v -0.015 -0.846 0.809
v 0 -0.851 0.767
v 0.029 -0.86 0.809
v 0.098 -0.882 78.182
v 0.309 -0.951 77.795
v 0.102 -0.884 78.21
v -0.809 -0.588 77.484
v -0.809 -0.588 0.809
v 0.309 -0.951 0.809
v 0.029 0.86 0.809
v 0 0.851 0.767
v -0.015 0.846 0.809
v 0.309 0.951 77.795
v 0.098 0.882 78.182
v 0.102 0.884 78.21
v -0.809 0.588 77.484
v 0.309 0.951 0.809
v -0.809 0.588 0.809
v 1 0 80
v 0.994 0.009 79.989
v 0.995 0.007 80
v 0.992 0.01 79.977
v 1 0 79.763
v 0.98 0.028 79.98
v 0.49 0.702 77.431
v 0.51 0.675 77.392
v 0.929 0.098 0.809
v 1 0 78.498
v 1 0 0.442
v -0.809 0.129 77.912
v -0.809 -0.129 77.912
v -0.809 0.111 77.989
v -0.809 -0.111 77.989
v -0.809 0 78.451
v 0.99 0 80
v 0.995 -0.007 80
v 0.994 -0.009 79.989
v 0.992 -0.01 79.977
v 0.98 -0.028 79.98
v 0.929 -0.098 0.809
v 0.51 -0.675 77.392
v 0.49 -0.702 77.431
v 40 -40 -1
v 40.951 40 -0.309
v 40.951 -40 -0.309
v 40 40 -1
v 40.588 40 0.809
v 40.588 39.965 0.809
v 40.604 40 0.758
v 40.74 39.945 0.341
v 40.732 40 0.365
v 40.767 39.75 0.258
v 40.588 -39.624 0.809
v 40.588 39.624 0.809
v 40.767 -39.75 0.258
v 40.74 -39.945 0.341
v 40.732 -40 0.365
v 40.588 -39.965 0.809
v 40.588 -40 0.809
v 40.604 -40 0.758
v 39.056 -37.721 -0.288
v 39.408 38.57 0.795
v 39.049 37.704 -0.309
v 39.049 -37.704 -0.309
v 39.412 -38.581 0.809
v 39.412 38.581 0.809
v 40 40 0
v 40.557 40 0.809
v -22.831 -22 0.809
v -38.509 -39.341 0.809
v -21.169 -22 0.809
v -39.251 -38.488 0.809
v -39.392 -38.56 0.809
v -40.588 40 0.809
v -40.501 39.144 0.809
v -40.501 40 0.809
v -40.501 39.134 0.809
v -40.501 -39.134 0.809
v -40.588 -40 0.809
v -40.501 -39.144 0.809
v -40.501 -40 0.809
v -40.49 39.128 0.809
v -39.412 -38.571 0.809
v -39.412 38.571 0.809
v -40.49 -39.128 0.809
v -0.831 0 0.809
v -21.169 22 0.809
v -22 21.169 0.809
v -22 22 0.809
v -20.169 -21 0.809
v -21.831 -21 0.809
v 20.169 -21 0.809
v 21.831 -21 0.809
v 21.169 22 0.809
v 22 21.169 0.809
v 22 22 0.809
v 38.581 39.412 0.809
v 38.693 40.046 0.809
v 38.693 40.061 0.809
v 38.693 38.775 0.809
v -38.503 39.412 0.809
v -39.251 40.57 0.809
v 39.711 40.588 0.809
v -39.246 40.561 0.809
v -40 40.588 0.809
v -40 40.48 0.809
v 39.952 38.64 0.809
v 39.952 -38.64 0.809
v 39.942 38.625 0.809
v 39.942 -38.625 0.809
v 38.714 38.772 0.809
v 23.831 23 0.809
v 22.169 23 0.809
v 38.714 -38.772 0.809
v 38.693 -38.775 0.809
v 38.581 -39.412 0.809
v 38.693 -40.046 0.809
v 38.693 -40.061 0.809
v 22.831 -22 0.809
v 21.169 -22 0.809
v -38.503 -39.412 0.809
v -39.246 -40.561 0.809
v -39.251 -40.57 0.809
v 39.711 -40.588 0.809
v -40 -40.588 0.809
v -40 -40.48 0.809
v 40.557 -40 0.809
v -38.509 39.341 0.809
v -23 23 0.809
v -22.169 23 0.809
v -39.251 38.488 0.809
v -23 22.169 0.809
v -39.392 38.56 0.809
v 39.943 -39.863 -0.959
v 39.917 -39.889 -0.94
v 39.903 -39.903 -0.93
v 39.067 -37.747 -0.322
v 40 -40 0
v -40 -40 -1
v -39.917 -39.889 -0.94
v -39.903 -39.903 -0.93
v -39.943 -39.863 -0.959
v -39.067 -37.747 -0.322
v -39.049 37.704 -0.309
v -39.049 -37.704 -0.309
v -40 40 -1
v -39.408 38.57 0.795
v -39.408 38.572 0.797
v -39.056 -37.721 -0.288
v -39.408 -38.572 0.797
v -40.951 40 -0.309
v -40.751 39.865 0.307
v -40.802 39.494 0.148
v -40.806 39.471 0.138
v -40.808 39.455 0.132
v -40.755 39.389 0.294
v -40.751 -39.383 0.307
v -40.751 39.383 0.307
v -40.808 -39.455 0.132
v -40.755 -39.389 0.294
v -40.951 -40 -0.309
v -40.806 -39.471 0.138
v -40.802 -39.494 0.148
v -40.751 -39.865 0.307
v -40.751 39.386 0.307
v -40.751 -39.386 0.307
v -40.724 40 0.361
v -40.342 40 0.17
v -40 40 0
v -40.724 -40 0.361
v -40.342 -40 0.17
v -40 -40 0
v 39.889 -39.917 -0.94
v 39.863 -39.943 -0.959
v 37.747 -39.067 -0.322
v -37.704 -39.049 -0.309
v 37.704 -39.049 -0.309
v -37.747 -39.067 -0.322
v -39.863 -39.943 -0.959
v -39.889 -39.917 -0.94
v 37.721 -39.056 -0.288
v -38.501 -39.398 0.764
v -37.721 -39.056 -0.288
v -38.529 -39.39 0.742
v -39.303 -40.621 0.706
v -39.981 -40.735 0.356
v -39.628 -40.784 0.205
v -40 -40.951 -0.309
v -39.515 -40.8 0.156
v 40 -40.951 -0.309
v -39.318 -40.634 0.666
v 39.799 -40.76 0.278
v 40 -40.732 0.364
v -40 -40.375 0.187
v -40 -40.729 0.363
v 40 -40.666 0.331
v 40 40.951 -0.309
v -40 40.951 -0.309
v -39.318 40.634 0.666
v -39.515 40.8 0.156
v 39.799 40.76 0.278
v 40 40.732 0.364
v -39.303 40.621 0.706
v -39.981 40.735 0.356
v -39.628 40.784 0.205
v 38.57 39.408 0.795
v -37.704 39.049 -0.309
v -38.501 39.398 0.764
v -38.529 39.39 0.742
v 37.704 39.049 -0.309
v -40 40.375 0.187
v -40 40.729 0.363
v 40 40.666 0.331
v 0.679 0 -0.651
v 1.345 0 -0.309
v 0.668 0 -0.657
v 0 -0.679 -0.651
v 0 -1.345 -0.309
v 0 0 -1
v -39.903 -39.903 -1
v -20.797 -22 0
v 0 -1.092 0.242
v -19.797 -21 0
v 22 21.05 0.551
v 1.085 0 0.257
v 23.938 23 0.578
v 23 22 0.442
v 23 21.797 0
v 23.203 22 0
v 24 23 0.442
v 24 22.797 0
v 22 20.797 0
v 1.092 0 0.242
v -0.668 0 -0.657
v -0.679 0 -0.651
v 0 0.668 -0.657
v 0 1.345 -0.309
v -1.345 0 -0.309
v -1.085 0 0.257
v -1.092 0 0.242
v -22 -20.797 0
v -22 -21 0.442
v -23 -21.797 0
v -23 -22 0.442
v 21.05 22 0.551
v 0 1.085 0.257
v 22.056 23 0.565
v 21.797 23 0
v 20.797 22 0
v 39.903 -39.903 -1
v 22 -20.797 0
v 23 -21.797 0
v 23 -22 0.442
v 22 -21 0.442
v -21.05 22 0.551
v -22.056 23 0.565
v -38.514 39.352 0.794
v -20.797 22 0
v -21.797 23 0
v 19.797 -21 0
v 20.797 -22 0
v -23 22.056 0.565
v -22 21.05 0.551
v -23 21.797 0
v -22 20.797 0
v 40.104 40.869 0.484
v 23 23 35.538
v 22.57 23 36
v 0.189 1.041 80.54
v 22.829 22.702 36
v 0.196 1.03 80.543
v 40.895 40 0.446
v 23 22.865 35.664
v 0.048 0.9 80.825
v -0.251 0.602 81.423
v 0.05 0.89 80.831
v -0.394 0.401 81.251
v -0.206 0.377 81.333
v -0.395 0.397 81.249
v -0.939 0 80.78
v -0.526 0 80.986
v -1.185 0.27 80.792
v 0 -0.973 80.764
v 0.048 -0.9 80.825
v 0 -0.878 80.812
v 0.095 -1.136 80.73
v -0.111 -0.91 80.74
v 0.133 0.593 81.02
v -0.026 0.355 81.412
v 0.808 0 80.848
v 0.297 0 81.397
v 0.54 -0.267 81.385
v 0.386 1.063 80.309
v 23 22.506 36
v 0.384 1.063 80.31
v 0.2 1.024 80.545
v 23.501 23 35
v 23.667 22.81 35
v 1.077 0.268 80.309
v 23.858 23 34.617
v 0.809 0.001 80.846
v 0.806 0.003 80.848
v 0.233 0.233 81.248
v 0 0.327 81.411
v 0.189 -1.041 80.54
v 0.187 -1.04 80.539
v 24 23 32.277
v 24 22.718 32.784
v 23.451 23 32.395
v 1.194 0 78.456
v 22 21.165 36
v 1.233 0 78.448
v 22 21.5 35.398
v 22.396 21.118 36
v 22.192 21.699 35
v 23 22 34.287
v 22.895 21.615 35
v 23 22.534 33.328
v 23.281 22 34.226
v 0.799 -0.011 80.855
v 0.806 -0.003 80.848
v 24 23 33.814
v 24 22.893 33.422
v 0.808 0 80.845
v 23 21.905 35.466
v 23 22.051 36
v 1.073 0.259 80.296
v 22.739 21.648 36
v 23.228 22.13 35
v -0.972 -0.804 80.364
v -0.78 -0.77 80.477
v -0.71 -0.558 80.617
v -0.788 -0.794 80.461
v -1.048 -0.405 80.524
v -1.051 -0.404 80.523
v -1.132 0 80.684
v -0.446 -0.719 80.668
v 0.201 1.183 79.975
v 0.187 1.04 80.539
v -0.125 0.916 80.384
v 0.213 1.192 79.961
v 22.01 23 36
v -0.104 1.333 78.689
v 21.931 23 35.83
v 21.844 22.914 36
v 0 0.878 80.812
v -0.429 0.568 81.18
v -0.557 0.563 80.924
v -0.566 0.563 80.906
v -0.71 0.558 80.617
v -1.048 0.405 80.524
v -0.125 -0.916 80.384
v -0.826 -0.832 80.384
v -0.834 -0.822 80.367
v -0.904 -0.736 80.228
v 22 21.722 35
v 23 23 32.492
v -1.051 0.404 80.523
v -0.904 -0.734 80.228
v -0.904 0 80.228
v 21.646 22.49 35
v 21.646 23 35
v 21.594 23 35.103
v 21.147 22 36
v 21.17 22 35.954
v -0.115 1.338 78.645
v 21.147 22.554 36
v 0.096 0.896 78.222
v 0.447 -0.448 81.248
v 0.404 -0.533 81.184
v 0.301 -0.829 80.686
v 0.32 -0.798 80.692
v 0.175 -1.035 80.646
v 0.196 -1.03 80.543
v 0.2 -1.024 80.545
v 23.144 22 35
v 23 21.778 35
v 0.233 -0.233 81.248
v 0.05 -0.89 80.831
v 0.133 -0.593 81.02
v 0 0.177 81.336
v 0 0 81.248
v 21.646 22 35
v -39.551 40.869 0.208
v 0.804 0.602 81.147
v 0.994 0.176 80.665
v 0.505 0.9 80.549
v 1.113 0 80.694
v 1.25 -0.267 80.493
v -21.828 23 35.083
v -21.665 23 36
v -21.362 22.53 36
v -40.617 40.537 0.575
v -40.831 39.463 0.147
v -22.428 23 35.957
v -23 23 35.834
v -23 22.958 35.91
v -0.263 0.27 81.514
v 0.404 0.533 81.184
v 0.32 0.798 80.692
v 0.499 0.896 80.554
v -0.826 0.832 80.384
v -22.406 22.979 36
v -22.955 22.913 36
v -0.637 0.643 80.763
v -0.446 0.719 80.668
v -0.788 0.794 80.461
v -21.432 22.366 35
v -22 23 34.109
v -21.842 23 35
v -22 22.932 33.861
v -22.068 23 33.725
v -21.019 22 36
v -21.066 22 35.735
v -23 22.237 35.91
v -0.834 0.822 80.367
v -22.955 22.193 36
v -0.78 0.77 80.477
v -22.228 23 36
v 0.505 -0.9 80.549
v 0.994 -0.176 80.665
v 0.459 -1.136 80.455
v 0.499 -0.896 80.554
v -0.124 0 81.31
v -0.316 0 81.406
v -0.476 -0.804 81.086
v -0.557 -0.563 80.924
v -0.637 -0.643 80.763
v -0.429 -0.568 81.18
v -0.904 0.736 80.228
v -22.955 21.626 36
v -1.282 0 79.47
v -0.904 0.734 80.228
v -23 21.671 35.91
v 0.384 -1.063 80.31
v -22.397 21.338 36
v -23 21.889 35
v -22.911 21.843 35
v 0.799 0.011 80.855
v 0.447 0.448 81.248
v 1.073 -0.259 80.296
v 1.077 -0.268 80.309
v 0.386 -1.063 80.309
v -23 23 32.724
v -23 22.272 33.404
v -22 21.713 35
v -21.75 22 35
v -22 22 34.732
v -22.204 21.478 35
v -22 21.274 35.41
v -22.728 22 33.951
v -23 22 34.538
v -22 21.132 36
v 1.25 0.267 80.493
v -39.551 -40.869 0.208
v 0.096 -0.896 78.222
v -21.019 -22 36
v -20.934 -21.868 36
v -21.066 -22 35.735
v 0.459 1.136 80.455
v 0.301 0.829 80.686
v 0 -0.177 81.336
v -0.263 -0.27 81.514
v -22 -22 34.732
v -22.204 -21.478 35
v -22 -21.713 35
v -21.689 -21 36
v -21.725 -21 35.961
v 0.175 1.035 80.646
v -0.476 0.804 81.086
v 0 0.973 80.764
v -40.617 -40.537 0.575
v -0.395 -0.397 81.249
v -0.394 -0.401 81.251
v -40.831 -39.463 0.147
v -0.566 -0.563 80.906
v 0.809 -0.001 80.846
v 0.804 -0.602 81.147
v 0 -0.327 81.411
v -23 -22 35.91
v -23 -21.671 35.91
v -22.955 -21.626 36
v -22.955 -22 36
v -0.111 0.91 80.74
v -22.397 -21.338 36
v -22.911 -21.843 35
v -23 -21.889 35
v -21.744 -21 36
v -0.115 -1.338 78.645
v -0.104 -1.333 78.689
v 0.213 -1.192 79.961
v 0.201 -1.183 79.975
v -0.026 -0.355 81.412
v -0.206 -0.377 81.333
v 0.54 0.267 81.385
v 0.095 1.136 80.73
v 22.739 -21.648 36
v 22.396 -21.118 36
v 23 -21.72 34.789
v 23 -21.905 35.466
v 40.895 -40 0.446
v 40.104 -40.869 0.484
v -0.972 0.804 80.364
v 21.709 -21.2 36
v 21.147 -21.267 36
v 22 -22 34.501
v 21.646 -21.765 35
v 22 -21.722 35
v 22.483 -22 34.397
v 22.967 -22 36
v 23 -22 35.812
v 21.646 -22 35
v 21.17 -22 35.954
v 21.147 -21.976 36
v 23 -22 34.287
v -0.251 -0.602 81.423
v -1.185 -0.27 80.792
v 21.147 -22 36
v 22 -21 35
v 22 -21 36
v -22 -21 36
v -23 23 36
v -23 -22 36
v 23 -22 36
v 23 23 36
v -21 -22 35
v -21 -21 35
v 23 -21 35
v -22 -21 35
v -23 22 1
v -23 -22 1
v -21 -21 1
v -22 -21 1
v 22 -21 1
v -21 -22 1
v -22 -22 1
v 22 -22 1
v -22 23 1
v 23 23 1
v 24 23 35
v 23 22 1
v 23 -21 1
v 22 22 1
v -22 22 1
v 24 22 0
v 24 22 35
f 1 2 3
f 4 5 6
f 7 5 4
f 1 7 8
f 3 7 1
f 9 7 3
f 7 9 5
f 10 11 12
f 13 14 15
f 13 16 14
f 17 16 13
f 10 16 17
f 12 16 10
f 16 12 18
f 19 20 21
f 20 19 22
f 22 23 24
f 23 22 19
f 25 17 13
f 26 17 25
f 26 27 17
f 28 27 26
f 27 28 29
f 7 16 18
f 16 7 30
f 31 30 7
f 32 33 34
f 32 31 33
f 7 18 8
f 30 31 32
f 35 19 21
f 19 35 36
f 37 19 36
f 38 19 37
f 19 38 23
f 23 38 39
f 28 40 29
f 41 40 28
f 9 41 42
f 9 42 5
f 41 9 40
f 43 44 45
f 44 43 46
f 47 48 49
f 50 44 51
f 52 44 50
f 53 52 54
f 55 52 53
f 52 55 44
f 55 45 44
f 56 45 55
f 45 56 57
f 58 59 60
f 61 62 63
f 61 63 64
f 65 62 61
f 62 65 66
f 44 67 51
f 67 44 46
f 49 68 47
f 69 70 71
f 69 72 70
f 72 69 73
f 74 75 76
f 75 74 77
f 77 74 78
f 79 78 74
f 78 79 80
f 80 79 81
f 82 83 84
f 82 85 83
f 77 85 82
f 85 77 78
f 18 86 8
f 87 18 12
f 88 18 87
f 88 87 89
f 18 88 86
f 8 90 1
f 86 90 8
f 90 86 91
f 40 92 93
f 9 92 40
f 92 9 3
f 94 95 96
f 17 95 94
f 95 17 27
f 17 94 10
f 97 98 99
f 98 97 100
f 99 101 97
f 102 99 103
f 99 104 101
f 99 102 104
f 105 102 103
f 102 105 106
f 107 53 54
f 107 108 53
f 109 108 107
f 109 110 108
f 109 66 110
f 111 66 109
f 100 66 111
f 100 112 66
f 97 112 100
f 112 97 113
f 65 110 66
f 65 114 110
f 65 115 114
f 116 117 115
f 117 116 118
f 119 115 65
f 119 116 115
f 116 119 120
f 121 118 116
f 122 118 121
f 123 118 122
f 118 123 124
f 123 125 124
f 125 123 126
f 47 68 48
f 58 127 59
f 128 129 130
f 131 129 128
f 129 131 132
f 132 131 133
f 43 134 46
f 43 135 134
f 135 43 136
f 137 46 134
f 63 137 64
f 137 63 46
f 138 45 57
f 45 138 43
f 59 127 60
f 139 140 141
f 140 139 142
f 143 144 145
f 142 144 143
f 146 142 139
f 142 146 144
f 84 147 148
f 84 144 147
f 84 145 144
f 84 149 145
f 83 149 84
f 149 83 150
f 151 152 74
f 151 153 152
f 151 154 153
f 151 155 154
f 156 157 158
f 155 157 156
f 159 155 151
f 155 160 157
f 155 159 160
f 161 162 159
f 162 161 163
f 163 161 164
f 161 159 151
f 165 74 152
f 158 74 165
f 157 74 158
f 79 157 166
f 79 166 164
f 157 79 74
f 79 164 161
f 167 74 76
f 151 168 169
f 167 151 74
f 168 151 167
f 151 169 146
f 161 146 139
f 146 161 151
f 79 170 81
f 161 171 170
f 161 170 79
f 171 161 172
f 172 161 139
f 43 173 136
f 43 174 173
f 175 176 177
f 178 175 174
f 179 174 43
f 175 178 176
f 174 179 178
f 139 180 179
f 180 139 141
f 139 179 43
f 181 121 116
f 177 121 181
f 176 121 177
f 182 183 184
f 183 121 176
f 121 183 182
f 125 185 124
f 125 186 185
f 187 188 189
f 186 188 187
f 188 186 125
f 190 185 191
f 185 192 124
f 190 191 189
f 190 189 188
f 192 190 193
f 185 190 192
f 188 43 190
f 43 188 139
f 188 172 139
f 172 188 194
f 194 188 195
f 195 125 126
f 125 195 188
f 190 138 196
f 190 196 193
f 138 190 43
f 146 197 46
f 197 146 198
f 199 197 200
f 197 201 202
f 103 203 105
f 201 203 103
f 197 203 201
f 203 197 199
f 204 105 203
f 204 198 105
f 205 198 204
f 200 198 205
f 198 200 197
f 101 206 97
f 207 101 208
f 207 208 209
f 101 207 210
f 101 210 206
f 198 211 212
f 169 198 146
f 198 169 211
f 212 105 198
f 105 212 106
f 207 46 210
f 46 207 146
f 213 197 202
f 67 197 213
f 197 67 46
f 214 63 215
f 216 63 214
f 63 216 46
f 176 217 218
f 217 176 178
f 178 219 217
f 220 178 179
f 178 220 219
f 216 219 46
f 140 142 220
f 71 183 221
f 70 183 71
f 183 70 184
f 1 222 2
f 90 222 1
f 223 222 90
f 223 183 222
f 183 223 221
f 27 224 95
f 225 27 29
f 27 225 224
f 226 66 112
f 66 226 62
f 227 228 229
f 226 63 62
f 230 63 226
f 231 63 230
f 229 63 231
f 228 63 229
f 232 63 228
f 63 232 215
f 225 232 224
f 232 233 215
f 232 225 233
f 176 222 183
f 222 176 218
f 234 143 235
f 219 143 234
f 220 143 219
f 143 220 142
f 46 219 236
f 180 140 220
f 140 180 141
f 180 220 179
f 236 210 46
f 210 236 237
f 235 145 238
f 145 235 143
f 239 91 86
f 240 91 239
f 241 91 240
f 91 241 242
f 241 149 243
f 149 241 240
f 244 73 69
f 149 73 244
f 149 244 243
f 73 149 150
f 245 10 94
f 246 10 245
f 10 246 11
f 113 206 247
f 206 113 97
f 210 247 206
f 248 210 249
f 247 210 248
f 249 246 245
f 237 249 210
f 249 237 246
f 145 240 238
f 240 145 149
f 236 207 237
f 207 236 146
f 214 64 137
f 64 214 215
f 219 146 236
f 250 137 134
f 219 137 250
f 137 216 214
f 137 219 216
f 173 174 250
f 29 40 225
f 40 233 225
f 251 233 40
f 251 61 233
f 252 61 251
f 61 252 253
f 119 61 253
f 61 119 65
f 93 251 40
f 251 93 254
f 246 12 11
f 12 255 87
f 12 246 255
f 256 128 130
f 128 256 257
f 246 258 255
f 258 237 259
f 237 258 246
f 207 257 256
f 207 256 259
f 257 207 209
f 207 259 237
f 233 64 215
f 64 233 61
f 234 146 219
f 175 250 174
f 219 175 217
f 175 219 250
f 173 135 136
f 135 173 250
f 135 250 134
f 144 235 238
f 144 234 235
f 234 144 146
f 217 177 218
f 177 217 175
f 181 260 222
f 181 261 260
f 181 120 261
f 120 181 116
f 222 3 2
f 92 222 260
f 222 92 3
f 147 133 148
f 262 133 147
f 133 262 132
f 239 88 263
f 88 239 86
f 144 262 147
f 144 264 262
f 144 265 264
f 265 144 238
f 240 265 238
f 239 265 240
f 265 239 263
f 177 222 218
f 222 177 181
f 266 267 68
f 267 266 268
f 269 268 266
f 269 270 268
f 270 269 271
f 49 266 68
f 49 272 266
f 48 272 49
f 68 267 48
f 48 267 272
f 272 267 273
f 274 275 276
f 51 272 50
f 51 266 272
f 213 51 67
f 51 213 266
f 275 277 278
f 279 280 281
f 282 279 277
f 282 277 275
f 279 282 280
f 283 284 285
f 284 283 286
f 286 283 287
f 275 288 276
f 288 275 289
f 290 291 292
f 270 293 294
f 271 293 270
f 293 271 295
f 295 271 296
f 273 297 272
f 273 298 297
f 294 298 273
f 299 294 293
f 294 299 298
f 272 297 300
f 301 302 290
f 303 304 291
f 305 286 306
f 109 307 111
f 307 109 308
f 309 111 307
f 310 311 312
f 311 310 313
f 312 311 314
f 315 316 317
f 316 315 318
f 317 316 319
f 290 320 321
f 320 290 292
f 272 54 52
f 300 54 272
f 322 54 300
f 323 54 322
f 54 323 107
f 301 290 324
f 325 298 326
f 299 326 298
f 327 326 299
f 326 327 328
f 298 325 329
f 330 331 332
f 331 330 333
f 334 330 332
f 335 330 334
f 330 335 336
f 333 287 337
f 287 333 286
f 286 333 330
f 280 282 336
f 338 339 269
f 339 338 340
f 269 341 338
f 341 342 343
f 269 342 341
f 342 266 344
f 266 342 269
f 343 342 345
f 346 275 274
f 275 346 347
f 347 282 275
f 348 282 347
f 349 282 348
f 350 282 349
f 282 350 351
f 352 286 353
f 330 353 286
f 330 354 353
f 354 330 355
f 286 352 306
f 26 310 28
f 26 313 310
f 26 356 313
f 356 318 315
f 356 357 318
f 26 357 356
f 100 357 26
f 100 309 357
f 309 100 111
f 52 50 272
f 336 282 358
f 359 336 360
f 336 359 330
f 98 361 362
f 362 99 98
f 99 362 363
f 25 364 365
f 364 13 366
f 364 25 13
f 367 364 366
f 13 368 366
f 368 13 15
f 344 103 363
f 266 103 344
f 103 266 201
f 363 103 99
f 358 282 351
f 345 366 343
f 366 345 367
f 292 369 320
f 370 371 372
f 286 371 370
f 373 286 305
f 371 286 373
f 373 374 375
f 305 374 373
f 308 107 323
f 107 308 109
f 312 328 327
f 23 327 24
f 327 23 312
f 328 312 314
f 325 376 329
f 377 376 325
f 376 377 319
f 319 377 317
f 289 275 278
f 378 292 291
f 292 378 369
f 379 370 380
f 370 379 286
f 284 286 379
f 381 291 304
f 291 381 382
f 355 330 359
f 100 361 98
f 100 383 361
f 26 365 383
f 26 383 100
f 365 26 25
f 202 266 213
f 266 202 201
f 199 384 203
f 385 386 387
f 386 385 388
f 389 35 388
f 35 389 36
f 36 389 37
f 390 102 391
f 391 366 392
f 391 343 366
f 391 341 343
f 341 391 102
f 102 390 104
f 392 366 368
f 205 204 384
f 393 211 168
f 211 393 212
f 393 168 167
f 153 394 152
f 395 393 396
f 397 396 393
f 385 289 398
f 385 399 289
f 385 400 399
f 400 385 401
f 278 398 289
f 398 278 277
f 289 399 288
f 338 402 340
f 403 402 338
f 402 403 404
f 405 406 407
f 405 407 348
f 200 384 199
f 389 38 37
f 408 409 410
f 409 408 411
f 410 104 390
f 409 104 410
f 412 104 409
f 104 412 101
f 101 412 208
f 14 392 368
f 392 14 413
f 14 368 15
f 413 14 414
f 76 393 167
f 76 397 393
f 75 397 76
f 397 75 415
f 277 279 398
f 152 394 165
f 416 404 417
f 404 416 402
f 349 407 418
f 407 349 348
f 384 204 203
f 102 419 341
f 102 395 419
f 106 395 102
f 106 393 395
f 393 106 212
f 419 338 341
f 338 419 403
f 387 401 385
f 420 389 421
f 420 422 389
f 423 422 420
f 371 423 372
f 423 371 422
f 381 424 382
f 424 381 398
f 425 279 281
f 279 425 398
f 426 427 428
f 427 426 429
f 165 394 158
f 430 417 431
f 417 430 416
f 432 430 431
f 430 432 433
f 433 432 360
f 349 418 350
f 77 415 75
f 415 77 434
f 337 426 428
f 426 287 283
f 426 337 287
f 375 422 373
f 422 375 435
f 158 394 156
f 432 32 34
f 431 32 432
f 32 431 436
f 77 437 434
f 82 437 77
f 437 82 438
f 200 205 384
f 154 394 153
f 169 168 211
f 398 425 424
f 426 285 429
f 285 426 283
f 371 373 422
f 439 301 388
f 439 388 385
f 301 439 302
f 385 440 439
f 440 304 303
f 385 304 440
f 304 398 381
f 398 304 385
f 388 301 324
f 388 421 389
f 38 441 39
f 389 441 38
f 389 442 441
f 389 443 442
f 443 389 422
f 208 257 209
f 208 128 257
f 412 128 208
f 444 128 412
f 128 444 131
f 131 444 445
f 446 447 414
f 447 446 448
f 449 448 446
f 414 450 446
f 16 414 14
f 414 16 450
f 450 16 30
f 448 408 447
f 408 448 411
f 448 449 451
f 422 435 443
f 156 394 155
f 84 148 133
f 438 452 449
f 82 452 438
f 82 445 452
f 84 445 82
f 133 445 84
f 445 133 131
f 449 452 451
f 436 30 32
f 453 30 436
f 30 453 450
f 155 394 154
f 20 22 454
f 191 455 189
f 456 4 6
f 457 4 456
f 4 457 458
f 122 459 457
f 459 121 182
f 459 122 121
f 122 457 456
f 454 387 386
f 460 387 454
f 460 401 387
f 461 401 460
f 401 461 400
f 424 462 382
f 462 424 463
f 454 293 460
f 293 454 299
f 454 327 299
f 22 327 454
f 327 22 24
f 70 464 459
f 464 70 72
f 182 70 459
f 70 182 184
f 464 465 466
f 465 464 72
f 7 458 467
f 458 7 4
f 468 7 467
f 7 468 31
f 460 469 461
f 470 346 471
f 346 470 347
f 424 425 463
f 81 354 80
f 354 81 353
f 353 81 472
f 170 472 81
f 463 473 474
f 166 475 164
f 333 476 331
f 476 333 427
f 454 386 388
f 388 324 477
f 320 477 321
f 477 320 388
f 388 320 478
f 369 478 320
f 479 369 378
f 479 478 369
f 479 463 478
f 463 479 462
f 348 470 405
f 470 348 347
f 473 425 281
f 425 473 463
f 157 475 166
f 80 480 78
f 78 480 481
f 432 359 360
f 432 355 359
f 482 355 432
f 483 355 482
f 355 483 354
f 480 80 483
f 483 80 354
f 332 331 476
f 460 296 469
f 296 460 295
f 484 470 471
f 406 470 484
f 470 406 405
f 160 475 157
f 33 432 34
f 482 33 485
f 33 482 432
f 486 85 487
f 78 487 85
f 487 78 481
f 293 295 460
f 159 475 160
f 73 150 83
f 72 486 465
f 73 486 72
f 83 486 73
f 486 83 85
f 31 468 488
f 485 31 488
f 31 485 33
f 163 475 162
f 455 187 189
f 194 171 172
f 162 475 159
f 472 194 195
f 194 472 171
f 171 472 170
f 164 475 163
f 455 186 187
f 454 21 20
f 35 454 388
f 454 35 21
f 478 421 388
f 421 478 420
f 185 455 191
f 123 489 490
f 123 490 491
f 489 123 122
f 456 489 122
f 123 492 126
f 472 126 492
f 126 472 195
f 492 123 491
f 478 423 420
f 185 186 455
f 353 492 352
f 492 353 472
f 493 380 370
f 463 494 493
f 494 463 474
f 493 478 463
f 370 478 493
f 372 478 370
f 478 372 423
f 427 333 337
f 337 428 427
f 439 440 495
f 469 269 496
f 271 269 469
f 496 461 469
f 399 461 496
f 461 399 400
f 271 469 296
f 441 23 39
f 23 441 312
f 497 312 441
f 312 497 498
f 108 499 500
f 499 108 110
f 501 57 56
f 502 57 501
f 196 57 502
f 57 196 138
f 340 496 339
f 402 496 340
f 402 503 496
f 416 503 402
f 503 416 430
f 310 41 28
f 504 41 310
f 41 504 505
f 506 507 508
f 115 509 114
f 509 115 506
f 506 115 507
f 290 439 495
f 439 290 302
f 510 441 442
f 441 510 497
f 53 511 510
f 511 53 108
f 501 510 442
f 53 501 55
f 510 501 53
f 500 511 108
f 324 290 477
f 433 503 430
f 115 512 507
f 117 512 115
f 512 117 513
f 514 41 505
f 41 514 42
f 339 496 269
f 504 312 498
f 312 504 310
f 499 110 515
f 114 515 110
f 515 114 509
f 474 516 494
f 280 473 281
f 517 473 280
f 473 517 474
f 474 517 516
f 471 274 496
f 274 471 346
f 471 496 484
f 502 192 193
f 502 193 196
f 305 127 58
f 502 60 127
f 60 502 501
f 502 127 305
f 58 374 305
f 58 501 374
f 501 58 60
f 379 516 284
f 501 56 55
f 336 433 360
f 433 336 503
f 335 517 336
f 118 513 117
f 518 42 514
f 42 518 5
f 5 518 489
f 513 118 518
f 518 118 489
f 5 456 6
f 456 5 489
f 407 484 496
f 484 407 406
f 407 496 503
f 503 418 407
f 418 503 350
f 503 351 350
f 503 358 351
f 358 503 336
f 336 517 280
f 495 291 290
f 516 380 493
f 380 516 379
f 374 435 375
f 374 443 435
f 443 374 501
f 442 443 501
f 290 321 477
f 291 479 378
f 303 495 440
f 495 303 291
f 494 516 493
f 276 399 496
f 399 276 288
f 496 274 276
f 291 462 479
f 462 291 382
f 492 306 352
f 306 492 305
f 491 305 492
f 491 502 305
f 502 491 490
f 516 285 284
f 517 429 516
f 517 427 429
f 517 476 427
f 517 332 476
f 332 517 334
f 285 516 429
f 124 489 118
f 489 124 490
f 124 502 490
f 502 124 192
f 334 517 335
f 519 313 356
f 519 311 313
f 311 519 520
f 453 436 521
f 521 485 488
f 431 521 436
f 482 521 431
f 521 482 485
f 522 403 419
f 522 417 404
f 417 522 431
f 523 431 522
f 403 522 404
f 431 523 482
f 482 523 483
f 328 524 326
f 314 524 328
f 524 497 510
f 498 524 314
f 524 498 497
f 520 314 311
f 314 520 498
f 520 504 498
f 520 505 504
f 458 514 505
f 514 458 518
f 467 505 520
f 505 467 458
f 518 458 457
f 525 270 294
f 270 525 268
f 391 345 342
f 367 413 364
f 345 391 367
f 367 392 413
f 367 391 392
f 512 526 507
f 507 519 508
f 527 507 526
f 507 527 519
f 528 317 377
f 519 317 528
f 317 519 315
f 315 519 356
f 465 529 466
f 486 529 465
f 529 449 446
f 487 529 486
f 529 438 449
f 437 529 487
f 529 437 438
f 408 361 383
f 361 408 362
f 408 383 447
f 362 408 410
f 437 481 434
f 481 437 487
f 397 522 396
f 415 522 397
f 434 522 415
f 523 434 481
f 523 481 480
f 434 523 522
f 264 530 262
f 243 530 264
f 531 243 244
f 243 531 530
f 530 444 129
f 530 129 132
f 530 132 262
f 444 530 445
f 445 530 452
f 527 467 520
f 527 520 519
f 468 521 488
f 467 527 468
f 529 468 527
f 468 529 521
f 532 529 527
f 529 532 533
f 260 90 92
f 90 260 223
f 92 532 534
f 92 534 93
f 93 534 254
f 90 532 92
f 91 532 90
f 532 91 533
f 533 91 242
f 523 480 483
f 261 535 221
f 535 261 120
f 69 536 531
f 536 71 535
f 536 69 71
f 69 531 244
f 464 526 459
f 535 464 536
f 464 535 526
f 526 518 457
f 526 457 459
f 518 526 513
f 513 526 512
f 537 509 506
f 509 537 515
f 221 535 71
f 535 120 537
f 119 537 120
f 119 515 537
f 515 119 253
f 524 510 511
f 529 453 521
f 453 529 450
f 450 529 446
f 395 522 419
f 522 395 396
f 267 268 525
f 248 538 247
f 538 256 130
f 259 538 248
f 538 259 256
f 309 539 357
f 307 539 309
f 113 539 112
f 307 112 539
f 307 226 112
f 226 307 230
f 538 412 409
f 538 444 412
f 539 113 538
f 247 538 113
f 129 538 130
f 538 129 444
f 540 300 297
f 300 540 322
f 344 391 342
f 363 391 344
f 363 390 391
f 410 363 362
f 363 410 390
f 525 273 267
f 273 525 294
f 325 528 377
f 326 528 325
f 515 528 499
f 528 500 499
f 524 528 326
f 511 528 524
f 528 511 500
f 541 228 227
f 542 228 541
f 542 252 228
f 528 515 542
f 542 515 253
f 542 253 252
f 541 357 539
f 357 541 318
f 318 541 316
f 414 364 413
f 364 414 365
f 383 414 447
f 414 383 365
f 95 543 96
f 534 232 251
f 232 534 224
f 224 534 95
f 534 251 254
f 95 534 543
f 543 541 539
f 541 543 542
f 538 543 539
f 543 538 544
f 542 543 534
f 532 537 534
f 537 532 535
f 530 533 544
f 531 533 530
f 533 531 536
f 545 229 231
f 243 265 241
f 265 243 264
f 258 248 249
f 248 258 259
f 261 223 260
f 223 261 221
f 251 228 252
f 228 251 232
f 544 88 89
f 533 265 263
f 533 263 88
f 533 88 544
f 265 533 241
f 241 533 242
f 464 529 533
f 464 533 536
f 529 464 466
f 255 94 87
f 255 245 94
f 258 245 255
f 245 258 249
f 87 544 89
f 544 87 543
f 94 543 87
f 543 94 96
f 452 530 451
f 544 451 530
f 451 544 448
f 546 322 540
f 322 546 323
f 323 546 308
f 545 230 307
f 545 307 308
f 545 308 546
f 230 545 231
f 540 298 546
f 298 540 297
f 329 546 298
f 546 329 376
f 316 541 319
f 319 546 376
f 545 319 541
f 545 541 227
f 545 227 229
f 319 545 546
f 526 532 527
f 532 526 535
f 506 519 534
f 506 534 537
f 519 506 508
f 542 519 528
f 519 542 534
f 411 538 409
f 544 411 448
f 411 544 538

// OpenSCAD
color([9,0,0]){
cylinder(80,1,1);
translate([40,40,0]) rotate([90,90,0]) cylinder(80,1,1);
translate([-40,40,0]) rotate([90,90,0]) cylinder(80,1,1);
translate([-40,-40,0]) rotate([0,90,0]) cylinder(80,1,1);
translate([-40,40,0]) rotate([0,90,0]) cylinder(80,1,1);
translate([40,40,0]) rotate([135,90,0]) cylinder(113,1,1);
translate([-40,40,0]) rotate([45,90,0]) cylinder(113,1,1);
translate([40,40,0]) rotate([24,-26.5,0]) cylinder(99,1,1);
translate([-40,40,0]) rotate([24,26.5,0]) cylinder(99,1,1);
translate([-40,-40,0]) rotate([-24,26.5,0]) cylinder(99,1,1);
translate([40,-40,0]) rotate([-24,-26.5,0]) cylinder(99,1,1);
}

color([0,0,0]){
translate([-23,-22,35]) cube([45,1,1]);
translate([-23,-22,35]) cube([1,45,1]);
translate([22,-22,35]) cube([1,45,1]);
translate([-23,22,35]) cube([45,1,1]);

translate([-23,-22,0]) cube([45,1,1]);
translate([-23,-22,0]) cube([1,45,1]);
translate([22,-22,0]) cube([1,45,1]);
translate([-23,22,0]) cube([45,1,1]);

translate([23,22,0]) cube([1,1,35]);
translate([-22,-22,0]) cube([1,1,35]);
translate([22,-22,0]) cube([1,1,35]);
translate([-23,22,0]) cube([1,1,35]);
}
